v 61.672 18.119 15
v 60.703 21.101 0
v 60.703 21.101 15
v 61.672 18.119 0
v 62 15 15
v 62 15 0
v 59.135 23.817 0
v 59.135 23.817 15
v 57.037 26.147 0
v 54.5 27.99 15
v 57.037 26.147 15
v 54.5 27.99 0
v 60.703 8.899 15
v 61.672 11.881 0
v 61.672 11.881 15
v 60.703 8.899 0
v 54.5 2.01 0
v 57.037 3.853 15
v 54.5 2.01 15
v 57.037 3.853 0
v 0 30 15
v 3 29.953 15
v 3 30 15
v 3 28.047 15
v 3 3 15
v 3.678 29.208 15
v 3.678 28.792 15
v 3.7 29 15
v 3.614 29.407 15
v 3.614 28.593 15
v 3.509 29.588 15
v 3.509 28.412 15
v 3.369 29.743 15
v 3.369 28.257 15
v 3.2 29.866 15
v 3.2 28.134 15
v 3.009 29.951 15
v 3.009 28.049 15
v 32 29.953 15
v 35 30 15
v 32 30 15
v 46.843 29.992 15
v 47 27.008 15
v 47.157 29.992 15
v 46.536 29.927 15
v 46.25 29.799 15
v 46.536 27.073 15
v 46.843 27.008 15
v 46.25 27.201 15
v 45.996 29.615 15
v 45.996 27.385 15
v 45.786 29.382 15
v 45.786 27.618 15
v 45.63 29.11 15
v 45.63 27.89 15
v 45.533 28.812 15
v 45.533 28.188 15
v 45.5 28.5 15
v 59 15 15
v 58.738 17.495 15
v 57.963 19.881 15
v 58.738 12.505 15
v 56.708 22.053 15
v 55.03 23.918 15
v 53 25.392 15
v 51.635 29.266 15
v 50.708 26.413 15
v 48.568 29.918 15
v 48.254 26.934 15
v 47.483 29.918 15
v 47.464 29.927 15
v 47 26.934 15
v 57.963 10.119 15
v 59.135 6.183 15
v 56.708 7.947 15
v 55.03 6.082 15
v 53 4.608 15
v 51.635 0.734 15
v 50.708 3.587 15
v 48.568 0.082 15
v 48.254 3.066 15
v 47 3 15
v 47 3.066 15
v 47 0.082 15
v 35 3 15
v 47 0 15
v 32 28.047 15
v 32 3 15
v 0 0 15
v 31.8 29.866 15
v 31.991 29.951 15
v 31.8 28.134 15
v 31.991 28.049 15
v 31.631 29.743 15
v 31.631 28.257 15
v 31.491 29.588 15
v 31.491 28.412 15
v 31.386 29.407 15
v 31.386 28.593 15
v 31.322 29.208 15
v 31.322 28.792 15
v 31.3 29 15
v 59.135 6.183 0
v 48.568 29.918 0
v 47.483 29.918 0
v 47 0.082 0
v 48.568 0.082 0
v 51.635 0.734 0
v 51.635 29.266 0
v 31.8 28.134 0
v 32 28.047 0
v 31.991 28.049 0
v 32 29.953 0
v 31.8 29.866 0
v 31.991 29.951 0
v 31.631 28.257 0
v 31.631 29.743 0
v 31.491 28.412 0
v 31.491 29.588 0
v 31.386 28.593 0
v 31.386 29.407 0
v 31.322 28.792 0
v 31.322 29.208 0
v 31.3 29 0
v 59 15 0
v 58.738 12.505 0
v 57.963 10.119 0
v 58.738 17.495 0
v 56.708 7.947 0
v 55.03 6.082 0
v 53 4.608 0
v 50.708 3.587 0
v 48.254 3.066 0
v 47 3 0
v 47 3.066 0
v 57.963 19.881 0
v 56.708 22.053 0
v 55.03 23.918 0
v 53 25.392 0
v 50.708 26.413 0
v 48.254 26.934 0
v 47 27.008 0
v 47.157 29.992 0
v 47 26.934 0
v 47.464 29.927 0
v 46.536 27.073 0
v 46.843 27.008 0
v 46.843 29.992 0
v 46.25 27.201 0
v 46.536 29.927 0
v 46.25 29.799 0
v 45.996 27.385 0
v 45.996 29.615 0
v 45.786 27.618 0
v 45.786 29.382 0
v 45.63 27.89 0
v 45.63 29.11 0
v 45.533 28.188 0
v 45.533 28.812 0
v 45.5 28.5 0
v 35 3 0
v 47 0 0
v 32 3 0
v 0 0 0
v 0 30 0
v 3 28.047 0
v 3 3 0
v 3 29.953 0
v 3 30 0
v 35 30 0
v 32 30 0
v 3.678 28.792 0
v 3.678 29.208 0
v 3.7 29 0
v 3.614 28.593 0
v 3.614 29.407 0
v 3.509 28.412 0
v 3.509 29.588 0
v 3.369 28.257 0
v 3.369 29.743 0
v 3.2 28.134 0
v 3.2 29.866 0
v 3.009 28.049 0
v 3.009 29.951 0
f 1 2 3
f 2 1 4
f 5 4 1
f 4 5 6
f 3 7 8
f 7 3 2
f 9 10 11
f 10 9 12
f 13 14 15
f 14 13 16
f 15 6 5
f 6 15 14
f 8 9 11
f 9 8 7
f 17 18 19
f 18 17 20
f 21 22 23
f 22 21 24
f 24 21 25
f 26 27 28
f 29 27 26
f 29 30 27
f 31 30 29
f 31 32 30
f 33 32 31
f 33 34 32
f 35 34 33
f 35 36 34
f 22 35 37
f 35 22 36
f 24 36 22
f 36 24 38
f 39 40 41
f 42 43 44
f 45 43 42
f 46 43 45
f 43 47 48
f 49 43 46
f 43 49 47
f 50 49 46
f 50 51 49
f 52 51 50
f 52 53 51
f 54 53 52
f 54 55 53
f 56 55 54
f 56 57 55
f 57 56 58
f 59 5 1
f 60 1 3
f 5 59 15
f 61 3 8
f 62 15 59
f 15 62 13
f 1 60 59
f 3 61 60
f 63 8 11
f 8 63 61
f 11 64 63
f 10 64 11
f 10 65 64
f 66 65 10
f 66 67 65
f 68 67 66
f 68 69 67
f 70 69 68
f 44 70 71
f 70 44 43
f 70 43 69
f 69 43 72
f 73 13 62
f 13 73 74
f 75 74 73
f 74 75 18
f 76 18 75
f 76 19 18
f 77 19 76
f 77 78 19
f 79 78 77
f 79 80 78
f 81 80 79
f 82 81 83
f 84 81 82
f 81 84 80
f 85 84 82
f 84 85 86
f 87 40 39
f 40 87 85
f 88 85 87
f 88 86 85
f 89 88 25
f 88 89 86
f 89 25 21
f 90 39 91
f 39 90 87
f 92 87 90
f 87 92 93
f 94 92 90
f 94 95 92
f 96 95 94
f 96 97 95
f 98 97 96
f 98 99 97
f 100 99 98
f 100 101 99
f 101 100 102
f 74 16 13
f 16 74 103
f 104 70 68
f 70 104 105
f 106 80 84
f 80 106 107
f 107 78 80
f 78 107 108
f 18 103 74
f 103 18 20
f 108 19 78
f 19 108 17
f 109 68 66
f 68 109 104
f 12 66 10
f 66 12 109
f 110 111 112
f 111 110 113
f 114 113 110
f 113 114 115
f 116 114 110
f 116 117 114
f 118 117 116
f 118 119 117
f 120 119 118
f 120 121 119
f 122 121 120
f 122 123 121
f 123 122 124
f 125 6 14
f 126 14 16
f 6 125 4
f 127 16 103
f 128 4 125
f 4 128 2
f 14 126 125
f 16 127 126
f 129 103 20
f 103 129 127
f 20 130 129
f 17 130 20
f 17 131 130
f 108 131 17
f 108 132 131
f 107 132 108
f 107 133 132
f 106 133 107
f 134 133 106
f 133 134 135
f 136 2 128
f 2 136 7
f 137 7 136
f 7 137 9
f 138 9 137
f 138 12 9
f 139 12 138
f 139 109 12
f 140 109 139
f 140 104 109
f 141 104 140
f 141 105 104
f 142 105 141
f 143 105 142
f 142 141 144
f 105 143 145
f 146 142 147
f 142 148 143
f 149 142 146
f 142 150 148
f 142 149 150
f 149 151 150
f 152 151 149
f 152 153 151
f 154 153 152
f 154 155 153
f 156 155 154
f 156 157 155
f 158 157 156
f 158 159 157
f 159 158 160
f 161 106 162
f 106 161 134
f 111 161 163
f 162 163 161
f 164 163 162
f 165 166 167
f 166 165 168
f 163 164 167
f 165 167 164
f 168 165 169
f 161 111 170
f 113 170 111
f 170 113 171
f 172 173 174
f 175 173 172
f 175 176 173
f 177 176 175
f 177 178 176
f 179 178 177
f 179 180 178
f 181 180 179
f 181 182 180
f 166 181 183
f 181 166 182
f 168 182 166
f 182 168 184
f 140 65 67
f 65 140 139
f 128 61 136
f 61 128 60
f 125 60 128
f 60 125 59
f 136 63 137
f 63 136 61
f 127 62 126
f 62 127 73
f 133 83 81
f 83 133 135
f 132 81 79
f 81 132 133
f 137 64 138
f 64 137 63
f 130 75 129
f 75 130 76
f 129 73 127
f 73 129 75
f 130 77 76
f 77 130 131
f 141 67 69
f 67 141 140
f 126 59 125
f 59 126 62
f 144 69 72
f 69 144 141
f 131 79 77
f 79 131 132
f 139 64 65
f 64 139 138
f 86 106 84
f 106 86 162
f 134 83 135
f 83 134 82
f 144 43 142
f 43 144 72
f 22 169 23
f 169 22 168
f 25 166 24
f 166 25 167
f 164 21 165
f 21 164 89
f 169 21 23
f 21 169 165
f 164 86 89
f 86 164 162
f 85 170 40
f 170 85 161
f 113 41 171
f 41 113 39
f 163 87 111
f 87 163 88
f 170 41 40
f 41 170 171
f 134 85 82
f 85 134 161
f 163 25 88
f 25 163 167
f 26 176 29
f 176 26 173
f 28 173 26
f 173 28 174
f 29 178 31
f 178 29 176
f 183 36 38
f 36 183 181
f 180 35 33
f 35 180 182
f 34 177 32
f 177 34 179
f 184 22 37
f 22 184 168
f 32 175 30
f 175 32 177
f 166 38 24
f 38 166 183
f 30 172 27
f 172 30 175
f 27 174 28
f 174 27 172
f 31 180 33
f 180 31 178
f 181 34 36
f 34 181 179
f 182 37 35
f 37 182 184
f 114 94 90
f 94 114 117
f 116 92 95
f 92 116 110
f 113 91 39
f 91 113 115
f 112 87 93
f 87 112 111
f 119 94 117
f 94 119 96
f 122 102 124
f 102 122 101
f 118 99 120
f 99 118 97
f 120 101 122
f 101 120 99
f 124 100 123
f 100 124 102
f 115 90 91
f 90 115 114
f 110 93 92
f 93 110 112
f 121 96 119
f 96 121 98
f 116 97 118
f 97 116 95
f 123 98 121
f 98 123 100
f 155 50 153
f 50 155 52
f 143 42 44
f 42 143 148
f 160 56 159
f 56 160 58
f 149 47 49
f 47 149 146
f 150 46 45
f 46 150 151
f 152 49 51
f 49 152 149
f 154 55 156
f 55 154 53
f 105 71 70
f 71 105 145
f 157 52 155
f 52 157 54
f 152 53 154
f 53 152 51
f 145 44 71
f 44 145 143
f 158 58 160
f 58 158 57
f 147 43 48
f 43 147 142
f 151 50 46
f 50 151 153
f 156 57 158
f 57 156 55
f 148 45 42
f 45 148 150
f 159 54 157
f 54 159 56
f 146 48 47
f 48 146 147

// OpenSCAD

//CUSTOMIZER VARIABLES
/* [Basic] */
//Table thickness
Table_Thickness=28;//[10:100]
//Length
Length=30;//[20:50]
//Clip thickness
Clip_Thickness=3;//[3:6]
//Clip width
Clip_Width=15;//[10:30]
//Max cable diameter
Cable_Diameter=10;//[3:20]
//CUSTOMIZER VARIABLES END

$fs=0.2;
cube ([Clip_Thickness,Length,Clip_Width]);
translate ([Table_Thickness+Clip_Thickness+1,0,0]) cube ([Clip_Thickness,Length,Clip_Width]);
cube ([Table_Thickness+Clip_Thickness*3+Cable_Diameter,Clip_Thickness,Clip_Width]);
translate ([Clip_Thickness-0.3,Length-1,0]) cylinder(h=Clip_Width,r=1);
translate ([Table_Thickness+Clip_Thickness+1.3,Length-1,0]) cylinder(h=Clip_Width,r=1);
translate ([Table_Thickness+Clip_Thickness*3+Cable_Diameter,Length-Clip_Thickness/2,0]) cylinder(h=Clip_Width,r=Clip_Thickness/2);
translate ([Table_Thickness+Clip_Thickness*3+Cable_Diameter,Length/2,0]) difference () {
	cylinder(h=Clip_Width,r=Length/2);
	translate ([0,0,-0.5])cylinder(h=Clip_Width+1,r=Length/2-Clip_Thickness);
	translate ([-Length/2,-Length/2,-0.5]) cube([Length/2,Length,Clip_Width+1]);
}
